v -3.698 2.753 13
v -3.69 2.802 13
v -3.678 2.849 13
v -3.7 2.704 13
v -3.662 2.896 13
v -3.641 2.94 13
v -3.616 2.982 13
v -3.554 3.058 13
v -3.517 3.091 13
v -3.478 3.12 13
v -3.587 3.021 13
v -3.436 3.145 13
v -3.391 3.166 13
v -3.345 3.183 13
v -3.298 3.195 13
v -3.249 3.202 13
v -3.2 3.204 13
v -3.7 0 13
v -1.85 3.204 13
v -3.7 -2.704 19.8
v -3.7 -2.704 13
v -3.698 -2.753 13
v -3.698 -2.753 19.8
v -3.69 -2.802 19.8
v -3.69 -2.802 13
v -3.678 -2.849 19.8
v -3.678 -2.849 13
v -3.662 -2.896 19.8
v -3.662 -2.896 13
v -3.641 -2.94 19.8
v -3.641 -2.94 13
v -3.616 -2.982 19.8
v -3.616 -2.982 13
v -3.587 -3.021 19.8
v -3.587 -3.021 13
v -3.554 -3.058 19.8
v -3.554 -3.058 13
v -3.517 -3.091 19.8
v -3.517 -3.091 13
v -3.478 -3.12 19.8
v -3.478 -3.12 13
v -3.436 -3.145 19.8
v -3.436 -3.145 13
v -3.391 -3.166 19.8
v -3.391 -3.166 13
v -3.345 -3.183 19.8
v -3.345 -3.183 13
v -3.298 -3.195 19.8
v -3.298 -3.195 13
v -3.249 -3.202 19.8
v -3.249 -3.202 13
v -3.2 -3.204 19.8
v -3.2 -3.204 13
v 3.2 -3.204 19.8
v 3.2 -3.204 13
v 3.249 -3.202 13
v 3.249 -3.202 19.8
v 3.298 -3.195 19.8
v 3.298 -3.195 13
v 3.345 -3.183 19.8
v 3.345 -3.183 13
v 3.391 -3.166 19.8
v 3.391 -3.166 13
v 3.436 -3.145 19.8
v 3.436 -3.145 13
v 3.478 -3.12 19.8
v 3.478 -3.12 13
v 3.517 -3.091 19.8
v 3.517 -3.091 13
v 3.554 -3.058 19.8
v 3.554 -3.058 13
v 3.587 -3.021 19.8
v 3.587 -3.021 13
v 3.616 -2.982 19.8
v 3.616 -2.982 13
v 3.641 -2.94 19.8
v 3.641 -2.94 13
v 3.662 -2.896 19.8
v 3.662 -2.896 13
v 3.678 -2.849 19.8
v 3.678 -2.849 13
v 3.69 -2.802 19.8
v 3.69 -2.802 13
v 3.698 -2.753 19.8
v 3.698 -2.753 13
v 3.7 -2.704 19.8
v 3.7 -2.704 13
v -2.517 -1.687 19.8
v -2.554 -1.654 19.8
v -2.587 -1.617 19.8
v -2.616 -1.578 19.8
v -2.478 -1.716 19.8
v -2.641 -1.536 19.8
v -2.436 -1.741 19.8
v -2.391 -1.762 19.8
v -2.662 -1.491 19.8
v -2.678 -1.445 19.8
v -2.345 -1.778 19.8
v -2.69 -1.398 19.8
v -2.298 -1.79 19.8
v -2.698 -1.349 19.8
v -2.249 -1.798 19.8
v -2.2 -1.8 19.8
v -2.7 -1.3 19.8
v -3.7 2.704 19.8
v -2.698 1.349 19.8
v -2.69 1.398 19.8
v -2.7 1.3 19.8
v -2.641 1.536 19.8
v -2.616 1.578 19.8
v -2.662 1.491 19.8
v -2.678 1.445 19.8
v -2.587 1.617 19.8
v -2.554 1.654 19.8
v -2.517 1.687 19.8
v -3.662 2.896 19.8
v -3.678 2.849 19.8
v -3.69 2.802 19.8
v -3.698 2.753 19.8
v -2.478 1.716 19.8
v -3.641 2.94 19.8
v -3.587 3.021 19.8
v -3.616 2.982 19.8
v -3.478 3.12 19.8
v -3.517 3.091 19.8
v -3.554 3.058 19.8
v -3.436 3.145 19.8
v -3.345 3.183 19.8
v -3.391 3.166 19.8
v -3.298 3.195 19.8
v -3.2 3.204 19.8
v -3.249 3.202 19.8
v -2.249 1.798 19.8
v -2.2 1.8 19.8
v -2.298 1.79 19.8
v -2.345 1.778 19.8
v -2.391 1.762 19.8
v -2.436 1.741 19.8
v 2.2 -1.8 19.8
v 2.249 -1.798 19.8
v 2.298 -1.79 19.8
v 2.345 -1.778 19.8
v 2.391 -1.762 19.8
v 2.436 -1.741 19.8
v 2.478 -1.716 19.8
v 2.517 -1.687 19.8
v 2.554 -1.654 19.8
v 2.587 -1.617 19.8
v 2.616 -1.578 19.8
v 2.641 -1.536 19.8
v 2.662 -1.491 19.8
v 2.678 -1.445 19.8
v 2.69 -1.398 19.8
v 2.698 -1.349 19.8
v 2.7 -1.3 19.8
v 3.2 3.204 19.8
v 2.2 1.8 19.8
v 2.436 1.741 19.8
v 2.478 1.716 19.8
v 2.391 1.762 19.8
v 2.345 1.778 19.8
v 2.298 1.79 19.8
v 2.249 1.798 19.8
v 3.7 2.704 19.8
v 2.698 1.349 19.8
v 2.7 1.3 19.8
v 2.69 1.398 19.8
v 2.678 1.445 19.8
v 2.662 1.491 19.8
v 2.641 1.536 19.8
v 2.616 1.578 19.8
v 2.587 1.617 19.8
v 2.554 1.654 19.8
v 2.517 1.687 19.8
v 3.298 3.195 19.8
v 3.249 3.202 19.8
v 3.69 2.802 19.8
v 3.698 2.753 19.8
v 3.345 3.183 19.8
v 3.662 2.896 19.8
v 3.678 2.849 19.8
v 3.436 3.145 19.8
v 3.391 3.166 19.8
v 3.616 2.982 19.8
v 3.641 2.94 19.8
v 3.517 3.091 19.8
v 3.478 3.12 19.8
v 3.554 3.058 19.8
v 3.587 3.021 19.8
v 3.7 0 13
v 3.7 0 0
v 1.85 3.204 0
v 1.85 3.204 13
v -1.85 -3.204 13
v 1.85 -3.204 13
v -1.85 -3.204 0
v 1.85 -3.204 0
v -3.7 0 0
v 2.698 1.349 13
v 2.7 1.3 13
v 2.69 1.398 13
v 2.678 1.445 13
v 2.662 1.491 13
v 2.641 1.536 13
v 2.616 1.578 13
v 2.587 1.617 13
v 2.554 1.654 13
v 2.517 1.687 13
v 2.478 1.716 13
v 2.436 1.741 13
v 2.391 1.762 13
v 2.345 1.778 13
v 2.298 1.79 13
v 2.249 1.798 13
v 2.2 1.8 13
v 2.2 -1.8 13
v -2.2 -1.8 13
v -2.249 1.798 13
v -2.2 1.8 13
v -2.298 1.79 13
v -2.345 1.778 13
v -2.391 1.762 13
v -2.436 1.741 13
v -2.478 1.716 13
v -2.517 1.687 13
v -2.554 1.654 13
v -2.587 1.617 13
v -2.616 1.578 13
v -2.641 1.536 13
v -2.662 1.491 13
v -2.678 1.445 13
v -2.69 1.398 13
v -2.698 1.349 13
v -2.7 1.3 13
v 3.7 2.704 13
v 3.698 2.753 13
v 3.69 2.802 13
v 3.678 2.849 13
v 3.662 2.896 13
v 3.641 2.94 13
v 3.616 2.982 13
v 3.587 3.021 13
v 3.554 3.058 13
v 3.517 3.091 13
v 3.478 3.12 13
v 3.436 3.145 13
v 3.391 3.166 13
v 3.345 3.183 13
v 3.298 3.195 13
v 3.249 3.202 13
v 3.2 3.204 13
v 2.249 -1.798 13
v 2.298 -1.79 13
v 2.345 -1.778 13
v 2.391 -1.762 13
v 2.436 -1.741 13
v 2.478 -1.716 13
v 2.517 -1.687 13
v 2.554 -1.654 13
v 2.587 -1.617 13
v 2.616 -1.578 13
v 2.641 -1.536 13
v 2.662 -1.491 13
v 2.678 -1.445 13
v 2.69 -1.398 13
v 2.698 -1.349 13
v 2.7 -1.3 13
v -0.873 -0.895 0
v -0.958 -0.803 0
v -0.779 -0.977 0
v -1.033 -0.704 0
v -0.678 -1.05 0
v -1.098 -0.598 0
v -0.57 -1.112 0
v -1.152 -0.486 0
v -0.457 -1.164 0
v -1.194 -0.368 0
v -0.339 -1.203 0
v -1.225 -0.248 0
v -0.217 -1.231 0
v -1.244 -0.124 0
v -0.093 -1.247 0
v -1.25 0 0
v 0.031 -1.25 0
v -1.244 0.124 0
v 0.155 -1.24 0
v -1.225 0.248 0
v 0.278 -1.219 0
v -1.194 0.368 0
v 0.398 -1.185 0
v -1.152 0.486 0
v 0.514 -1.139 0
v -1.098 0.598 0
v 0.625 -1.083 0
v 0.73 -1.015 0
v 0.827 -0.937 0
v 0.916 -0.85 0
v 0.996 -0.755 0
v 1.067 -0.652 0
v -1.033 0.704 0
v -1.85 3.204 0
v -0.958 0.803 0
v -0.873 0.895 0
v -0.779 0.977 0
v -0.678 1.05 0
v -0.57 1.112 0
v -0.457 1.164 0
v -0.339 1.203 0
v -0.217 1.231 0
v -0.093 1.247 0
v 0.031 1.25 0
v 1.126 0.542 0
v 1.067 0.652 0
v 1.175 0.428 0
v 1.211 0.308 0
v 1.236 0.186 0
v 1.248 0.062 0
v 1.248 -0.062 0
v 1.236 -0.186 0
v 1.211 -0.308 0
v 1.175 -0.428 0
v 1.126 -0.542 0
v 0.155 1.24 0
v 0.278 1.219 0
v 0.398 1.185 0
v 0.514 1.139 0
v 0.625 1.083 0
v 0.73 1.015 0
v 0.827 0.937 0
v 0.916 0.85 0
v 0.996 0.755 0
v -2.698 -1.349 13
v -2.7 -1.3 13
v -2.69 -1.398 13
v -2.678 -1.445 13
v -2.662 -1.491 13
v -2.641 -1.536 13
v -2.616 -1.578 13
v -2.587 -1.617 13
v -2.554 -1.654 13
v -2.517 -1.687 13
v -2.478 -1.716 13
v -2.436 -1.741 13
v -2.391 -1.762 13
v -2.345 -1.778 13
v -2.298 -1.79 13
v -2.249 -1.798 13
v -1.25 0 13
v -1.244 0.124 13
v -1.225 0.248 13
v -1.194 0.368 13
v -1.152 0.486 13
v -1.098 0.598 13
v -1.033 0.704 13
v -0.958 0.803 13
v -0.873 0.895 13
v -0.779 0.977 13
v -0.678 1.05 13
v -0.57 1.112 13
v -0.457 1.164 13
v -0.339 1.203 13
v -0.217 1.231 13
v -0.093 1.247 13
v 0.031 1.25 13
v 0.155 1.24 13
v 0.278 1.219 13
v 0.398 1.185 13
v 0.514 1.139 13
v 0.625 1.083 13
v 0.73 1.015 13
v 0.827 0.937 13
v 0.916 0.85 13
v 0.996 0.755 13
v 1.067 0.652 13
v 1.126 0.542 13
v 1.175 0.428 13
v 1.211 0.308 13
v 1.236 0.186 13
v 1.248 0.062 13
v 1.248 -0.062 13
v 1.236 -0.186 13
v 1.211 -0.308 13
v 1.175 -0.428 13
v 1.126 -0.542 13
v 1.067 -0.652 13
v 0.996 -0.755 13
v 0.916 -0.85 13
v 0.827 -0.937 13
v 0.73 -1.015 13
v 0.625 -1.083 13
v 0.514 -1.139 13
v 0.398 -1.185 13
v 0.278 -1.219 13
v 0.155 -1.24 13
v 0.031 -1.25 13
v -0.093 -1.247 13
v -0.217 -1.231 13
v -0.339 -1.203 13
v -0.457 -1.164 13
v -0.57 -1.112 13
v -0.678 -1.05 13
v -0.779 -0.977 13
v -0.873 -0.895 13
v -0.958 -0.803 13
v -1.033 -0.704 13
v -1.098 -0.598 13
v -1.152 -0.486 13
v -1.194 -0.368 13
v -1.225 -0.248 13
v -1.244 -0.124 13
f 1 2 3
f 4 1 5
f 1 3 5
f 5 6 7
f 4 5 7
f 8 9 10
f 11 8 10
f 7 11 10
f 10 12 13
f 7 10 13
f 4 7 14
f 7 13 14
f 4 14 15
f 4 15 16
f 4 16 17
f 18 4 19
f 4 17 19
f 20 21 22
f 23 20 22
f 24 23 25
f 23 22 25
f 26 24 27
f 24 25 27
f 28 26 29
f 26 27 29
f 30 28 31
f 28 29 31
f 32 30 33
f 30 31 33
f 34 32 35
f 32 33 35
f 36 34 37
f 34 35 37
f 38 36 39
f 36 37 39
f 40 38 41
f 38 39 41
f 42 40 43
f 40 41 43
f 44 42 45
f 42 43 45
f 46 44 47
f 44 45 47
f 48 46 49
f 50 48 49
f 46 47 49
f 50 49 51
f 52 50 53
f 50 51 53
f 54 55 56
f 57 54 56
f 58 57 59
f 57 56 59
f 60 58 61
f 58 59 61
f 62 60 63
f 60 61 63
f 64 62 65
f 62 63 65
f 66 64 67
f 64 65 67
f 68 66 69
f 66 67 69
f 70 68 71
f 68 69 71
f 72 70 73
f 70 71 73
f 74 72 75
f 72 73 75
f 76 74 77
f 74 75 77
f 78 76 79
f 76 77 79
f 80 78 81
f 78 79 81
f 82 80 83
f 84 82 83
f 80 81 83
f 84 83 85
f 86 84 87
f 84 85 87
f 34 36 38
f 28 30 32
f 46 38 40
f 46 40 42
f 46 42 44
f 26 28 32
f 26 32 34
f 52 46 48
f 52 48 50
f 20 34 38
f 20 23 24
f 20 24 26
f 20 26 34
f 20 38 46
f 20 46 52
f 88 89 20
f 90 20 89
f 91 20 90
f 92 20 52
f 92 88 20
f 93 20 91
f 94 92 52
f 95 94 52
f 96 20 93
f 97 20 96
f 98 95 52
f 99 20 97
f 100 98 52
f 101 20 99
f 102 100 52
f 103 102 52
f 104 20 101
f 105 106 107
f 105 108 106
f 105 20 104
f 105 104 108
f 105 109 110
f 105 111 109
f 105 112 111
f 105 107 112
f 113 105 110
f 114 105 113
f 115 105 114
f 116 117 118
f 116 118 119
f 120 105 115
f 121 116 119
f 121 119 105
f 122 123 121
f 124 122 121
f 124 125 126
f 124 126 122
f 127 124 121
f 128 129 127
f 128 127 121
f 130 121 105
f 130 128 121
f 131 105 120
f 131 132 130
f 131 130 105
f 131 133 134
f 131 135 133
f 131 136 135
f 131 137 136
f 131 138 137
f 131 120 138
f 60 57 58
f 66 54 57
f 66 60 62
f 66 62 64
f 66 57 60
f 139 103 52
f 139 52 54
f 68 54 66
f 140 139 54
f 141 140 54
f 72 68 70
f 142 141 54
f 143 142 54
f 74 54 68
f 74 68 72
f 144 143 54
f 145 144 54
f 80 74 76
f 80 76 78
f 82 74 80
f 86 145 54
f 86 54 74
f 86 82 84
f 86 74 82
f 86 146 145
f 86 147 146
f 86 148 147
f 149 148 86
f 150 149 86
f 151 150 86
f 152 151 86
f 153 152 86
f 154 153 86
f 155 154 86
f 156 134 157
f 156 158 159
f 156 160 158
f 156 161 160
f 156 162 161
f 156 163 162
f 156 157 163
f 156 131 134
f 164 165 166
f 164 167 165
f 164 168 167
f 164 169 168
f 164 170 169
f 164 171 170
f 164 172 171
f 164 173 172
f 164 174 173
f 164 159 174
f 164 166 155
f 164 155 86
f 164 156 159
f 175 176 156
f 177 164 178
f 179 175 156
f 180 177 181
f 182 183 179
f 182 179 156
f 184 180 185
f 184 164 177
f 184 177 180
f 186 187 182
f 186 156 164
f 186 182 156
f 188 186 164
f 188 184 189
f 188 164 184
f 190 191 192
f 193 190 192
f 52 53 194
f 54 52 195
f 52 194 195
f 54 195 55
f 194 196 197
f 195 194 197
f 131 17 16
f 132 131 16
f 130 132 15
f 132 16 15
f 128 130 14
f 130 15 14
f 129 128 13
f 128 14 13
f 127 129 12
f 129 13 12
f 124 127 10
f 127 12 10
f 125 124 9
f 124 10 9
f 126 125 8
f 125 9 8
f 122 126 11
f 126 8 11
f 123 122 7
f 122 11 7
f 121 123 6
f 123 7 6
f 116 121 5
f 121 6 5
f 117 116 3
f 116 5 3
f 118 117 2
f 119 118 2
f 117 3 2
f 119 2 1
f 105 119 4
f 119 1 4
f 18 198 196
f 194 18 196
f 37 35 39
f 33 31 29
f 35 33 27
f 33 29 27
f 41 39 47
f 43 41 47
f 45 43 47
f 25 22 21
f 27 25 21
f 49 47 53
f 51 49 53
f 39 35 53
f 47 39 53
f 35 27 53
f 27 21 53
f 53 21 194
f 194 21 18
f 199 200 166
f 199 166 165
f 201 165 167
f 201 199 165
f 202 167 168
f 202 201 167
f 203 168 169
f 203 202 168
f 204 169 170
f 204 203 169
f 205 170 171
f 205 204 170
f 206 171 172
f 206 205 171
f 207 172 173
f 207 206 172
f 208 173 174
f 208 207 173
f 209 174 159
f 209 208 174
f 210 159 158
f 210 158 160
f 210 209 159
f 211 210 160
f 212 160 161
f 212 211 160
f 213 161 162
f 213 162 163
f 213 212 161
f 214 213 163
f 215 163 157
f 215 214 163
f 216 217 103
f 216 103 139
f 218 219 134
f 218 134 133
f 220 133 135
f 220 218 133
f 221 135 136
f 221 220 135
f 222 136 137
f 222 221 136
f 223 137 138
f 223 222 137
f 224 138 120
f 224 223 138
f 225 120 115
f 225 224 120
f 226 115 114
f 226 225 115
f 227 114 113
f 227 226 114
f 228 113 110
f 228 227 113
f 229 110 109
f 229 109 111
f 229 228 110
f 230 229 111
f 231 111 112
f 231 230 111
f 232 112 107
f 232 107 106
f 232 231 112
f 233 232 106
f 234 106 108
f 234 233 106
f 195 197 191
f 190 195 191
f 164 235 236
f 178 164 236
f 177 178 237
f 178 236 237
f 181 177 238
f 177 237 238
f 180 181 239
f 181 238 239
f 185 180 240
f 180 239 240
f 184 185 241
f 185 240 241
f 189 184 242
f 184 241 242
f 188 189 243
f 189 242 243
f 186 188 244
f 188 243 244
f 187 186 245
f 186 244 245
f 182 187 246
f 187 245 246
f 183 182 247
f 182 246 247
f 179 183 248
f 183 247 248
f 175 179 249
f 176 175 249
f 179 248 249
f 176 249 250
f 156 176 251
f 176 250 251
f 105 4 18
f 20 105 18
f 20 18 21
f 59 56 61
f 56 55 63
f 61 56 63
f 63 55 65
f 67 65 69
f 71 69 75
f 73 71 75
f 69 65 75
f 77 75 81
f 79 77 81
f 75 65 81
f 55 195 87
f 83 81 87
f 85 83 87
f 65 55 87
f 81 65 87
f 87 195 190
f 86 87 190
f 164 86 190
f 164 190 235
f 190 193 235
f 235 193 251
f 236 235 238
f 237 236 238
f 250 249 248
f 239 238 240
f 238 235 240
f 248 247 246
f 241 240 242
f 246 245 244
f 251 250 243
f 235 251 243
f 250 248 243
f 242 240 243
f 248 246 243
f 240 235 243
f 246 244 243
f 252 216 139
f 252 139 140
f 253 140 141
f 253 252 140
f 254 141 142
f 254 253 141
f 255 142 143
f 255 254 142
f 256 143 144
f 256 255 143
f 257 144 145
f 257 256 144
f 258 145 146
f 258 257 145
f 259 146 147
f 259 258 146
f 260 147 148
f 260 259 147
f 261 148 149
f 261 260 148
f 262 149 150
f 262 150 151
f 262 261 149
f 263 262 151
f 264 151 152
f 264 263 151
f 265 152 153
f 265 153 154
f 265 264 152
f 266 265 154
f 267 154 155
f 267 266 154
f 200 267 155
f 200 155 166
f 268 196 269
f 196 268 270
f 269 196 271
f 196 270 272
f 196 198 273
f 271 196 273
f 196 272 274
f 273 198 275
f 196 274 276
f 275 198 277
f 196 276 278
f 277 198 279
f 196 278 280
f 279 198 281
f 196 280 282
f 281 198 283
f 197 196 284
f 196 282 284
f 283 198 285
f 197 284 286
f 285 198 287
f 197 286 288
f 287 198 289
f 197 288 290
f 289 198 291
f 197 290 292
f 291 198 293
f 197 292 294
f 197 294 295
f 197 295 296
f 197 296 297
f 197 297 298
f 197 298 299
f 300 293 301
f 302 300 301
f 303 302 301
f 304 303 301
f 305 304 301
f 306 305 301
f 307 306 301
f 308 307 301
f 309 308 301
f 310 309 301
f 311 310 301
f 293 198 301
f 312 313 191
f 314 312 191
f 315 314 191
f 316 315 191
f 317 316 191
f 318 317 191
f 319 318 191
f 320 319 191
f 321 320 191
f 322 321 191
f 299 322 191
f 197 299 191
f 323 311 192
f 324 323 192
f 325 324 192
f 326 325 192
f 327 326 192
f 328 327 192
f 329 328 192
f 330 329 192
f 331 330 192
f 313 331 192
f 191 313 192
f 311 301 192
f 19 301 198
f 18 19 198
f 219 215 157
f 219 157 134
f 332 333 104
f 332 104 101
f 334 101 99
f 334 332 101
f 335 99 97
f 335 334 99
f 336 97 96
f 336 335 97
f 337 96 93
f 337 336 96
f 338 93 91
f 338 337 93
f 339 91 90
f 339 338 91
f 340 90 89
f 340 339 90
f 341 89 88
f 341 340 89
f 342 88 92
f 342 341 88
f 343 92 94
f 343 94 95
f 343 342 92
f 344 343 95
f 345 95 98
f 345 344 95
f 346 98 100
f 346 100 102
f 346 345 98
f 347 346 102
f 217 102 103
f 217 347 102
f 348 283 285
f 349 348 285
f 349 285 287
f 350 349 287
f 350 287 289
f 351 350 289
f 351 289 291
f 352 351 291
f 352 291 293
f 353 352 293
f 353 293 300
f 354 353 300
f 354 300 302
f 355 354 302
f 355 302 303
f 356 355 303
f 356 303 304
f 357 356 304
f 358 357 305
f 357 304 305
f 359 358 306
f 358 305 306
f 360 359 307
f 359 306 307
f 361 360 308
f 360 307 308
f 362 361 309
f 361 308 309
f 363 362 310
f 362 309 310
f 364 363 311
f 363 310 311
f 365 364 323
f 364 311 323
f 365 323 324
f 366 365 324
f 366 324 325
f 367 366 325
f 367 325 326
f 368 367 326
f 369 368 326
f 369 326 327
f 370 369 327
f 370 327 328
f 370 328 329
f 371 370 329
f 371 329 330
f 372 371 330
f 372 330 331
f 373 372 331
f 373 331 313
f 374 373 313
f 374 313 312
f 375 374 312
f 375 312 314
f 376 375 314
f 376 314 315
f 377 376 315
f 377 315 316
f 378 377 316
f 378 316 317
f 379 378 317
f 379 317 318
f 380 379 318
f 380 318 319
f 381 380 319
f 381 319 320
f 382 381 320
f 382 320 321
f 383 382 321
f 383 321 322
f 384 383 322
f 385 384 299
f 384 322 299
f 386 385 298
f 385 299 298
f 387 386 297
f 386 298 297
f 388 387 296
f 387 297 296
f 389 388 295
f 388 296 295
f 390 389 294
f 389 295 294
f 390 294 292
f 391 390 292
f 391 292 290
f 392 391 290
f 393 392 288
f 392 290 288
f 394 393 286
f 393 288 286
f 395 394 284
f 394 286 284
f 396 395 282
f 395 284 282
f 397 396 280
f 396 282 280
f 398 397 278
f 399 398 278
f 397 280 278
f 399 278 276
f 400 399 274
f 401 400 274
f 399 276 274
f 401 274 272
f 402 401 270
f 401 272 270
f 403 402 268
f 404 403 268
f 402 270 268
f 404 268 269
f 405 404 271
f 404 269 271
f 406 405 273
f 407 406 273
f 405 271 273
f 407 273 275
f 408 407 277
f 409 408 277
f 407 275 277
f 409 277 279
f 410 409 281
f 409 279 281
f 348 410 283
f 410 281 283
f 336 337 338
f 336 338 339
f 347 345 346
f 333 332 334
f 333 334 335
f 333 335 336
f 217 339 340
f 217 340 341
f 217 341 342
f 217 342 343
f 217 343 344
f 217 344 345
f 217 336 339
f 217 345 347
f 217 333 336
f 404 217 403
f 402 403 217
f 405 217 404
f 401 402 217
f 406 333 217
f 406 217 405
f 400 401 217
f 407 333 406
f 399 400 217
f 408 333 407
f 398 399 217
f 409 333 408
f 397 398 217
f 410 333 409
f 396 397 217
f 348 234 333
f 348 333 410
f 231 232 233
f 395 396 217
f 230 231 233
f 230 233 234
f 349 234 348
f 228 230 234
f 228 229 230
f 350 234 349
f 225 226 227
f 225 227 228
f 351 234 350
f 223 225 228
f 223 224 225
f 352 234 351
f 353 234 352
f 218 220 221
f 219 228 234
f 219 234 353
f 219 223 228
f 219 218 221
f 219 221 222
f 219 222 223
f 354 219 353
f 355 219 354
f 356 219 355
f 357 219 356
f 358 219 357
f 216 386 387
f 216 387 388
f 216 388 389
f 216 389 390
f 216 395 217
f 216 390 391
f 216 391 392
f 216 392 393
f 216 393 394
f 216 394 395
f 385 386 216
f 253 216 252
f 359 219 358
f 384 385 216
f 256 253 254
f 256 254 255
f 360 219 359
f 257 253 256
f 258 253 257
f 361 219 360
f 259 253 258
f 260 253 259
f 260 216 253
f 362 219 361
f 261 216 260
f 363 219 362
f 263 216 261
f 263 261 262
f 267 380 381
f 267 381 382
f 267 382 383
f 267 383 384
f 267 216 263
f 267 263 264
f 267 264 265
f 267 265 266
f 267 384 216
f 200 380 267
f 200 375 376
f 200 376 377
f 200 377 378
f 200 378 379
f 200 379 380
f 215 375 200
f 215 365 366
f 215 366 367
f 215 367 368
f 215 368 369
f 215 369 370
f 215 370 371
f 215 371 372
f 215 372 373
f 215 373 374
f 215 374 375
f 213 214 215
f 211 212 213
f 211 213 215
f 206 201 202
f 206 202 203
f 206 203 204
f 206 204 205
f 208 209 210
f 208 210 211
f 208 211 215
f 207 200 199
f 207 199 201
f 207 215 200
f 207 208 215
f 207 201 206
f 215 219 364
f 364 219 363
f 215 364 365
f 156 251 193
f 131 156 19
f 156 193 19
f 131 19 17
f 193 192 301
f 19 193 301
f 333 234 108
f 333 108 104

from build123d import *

# Parameters (mm, degrees)
Y_KSEKLIK_EKSTR_ZYON1_DEPTH = 13
Y_KSEKLIK_EKSTR_ZYON2_DEPTH = 6.8
IZIM3_R                     = 1.25
KES_EKSTR_ZYON1_DEPTH       = 13.8


with BuildPart() as part:
    # Çizim1 → Yükseklik-Ekstrüzyon1 (new body)
    with BuildSketch(Plane.XY):
        Polygon((3.7, 0), (1.85, 3.204293994), (-1.85, 3.204293994), (-3.7, 0), (-1.85, -3.204293994), (1.85, -3.204293994), align=None)
    extrude(amount=Y_KSEKLIK_EKSTR_ZYON1_DEPTH)

    # Çizim2 → Yükseklik-Ekstrüzyon2 (add)
    with BuildSketch(Plane.XY.offset(13)):
        with BuildLine():
            Line((1.85, -3.204293994), (3.2, -3.204293994))
            ThreePointArc((3.2, -3.204293994), (3.553553391, -3.057847385), (3.7, -2.704293994))
            Line((3.7, -2.704293994), (3.7, -2))
            Line((3.7, -2), (3.7, 2.325966452))
            Line((3.7, 2.325966452), (3.7, 2.704293994))
            ThreePointArc((3.7, 2.704293994), (3.553553391, 3.057847385), (3.2, 3.204293994))
            Line((3.2, 3.204293994), (1.85, 3.204293994))
            Line((1.85, 3.204293994), (-1.85, 3.204293994))
            Line((-1.85, 3.204293994), (-3.2, 3.204293994))
            ThreePointArc((-3.2, 3.204293994), (-3.553553391, 3.057847385), (-3.7, 2.704293994))
            Line((-3.7, 2.704293994), (-3.7, 2.328172496))
            Line((-3.7, 2.328172496), (-3.7, -2))
            Line((-3.7, -2), (-3.7, -2.704293994))
            ThreePointArc((-3.7, -2.704293994), (-3.553553391, -3.057847385), (-3.2, -3.204293994))
            Line((-3.2, -3.204293994), (-1.85, -3.204293994))
            Line((-1.85, -3.204293994), (1.85, -3.204293994))
        make_face()
        with BuildLine():
            Line((-2.2, -1.8), (2.2, -1.8))
            ThreePointArc((2.2, -1.8), (2.553553391, -1.653553391), (2.7, -1.3))
            Line((2.7, -1.3), (2.7, 1.3))
            ThreePointArc((2.7, 1.3), (2.553553391, 1.653553391), (2.2, 1.8))
            Line((2.2, 1.8), (-2.2, 1.8))
            ThreePointArc((-2.2, 1.8), (-2.553553391, 1.653553391), (-2.7, 1.3))
            Line((-2.7, 1.3), (-2.7, -1.3))
            ThreePointArc((-2.7, -1.3), (-2.553553391, -1.653553391), (-2.2, -1.8))
        make_face(mode=Mode.SUBTRACT)
    extrude(amount=Y_KSEKLIK_EKSTR_ZYON2_DEPTH)

    # Çizim3 → Kes-Ekstrüzyon1 (cut)
    with BuildSketch(Plane(origin=(0, 0, 0), x_dir=(-1, 0, 0), z_dir=(0, 0, -1))):
        Circle(IZIM3_R)
    extrude(amount=-KES_EKSTR_ZYON1_DEPTH, mode=Mode.SUBTRACT)


solid = part.part
